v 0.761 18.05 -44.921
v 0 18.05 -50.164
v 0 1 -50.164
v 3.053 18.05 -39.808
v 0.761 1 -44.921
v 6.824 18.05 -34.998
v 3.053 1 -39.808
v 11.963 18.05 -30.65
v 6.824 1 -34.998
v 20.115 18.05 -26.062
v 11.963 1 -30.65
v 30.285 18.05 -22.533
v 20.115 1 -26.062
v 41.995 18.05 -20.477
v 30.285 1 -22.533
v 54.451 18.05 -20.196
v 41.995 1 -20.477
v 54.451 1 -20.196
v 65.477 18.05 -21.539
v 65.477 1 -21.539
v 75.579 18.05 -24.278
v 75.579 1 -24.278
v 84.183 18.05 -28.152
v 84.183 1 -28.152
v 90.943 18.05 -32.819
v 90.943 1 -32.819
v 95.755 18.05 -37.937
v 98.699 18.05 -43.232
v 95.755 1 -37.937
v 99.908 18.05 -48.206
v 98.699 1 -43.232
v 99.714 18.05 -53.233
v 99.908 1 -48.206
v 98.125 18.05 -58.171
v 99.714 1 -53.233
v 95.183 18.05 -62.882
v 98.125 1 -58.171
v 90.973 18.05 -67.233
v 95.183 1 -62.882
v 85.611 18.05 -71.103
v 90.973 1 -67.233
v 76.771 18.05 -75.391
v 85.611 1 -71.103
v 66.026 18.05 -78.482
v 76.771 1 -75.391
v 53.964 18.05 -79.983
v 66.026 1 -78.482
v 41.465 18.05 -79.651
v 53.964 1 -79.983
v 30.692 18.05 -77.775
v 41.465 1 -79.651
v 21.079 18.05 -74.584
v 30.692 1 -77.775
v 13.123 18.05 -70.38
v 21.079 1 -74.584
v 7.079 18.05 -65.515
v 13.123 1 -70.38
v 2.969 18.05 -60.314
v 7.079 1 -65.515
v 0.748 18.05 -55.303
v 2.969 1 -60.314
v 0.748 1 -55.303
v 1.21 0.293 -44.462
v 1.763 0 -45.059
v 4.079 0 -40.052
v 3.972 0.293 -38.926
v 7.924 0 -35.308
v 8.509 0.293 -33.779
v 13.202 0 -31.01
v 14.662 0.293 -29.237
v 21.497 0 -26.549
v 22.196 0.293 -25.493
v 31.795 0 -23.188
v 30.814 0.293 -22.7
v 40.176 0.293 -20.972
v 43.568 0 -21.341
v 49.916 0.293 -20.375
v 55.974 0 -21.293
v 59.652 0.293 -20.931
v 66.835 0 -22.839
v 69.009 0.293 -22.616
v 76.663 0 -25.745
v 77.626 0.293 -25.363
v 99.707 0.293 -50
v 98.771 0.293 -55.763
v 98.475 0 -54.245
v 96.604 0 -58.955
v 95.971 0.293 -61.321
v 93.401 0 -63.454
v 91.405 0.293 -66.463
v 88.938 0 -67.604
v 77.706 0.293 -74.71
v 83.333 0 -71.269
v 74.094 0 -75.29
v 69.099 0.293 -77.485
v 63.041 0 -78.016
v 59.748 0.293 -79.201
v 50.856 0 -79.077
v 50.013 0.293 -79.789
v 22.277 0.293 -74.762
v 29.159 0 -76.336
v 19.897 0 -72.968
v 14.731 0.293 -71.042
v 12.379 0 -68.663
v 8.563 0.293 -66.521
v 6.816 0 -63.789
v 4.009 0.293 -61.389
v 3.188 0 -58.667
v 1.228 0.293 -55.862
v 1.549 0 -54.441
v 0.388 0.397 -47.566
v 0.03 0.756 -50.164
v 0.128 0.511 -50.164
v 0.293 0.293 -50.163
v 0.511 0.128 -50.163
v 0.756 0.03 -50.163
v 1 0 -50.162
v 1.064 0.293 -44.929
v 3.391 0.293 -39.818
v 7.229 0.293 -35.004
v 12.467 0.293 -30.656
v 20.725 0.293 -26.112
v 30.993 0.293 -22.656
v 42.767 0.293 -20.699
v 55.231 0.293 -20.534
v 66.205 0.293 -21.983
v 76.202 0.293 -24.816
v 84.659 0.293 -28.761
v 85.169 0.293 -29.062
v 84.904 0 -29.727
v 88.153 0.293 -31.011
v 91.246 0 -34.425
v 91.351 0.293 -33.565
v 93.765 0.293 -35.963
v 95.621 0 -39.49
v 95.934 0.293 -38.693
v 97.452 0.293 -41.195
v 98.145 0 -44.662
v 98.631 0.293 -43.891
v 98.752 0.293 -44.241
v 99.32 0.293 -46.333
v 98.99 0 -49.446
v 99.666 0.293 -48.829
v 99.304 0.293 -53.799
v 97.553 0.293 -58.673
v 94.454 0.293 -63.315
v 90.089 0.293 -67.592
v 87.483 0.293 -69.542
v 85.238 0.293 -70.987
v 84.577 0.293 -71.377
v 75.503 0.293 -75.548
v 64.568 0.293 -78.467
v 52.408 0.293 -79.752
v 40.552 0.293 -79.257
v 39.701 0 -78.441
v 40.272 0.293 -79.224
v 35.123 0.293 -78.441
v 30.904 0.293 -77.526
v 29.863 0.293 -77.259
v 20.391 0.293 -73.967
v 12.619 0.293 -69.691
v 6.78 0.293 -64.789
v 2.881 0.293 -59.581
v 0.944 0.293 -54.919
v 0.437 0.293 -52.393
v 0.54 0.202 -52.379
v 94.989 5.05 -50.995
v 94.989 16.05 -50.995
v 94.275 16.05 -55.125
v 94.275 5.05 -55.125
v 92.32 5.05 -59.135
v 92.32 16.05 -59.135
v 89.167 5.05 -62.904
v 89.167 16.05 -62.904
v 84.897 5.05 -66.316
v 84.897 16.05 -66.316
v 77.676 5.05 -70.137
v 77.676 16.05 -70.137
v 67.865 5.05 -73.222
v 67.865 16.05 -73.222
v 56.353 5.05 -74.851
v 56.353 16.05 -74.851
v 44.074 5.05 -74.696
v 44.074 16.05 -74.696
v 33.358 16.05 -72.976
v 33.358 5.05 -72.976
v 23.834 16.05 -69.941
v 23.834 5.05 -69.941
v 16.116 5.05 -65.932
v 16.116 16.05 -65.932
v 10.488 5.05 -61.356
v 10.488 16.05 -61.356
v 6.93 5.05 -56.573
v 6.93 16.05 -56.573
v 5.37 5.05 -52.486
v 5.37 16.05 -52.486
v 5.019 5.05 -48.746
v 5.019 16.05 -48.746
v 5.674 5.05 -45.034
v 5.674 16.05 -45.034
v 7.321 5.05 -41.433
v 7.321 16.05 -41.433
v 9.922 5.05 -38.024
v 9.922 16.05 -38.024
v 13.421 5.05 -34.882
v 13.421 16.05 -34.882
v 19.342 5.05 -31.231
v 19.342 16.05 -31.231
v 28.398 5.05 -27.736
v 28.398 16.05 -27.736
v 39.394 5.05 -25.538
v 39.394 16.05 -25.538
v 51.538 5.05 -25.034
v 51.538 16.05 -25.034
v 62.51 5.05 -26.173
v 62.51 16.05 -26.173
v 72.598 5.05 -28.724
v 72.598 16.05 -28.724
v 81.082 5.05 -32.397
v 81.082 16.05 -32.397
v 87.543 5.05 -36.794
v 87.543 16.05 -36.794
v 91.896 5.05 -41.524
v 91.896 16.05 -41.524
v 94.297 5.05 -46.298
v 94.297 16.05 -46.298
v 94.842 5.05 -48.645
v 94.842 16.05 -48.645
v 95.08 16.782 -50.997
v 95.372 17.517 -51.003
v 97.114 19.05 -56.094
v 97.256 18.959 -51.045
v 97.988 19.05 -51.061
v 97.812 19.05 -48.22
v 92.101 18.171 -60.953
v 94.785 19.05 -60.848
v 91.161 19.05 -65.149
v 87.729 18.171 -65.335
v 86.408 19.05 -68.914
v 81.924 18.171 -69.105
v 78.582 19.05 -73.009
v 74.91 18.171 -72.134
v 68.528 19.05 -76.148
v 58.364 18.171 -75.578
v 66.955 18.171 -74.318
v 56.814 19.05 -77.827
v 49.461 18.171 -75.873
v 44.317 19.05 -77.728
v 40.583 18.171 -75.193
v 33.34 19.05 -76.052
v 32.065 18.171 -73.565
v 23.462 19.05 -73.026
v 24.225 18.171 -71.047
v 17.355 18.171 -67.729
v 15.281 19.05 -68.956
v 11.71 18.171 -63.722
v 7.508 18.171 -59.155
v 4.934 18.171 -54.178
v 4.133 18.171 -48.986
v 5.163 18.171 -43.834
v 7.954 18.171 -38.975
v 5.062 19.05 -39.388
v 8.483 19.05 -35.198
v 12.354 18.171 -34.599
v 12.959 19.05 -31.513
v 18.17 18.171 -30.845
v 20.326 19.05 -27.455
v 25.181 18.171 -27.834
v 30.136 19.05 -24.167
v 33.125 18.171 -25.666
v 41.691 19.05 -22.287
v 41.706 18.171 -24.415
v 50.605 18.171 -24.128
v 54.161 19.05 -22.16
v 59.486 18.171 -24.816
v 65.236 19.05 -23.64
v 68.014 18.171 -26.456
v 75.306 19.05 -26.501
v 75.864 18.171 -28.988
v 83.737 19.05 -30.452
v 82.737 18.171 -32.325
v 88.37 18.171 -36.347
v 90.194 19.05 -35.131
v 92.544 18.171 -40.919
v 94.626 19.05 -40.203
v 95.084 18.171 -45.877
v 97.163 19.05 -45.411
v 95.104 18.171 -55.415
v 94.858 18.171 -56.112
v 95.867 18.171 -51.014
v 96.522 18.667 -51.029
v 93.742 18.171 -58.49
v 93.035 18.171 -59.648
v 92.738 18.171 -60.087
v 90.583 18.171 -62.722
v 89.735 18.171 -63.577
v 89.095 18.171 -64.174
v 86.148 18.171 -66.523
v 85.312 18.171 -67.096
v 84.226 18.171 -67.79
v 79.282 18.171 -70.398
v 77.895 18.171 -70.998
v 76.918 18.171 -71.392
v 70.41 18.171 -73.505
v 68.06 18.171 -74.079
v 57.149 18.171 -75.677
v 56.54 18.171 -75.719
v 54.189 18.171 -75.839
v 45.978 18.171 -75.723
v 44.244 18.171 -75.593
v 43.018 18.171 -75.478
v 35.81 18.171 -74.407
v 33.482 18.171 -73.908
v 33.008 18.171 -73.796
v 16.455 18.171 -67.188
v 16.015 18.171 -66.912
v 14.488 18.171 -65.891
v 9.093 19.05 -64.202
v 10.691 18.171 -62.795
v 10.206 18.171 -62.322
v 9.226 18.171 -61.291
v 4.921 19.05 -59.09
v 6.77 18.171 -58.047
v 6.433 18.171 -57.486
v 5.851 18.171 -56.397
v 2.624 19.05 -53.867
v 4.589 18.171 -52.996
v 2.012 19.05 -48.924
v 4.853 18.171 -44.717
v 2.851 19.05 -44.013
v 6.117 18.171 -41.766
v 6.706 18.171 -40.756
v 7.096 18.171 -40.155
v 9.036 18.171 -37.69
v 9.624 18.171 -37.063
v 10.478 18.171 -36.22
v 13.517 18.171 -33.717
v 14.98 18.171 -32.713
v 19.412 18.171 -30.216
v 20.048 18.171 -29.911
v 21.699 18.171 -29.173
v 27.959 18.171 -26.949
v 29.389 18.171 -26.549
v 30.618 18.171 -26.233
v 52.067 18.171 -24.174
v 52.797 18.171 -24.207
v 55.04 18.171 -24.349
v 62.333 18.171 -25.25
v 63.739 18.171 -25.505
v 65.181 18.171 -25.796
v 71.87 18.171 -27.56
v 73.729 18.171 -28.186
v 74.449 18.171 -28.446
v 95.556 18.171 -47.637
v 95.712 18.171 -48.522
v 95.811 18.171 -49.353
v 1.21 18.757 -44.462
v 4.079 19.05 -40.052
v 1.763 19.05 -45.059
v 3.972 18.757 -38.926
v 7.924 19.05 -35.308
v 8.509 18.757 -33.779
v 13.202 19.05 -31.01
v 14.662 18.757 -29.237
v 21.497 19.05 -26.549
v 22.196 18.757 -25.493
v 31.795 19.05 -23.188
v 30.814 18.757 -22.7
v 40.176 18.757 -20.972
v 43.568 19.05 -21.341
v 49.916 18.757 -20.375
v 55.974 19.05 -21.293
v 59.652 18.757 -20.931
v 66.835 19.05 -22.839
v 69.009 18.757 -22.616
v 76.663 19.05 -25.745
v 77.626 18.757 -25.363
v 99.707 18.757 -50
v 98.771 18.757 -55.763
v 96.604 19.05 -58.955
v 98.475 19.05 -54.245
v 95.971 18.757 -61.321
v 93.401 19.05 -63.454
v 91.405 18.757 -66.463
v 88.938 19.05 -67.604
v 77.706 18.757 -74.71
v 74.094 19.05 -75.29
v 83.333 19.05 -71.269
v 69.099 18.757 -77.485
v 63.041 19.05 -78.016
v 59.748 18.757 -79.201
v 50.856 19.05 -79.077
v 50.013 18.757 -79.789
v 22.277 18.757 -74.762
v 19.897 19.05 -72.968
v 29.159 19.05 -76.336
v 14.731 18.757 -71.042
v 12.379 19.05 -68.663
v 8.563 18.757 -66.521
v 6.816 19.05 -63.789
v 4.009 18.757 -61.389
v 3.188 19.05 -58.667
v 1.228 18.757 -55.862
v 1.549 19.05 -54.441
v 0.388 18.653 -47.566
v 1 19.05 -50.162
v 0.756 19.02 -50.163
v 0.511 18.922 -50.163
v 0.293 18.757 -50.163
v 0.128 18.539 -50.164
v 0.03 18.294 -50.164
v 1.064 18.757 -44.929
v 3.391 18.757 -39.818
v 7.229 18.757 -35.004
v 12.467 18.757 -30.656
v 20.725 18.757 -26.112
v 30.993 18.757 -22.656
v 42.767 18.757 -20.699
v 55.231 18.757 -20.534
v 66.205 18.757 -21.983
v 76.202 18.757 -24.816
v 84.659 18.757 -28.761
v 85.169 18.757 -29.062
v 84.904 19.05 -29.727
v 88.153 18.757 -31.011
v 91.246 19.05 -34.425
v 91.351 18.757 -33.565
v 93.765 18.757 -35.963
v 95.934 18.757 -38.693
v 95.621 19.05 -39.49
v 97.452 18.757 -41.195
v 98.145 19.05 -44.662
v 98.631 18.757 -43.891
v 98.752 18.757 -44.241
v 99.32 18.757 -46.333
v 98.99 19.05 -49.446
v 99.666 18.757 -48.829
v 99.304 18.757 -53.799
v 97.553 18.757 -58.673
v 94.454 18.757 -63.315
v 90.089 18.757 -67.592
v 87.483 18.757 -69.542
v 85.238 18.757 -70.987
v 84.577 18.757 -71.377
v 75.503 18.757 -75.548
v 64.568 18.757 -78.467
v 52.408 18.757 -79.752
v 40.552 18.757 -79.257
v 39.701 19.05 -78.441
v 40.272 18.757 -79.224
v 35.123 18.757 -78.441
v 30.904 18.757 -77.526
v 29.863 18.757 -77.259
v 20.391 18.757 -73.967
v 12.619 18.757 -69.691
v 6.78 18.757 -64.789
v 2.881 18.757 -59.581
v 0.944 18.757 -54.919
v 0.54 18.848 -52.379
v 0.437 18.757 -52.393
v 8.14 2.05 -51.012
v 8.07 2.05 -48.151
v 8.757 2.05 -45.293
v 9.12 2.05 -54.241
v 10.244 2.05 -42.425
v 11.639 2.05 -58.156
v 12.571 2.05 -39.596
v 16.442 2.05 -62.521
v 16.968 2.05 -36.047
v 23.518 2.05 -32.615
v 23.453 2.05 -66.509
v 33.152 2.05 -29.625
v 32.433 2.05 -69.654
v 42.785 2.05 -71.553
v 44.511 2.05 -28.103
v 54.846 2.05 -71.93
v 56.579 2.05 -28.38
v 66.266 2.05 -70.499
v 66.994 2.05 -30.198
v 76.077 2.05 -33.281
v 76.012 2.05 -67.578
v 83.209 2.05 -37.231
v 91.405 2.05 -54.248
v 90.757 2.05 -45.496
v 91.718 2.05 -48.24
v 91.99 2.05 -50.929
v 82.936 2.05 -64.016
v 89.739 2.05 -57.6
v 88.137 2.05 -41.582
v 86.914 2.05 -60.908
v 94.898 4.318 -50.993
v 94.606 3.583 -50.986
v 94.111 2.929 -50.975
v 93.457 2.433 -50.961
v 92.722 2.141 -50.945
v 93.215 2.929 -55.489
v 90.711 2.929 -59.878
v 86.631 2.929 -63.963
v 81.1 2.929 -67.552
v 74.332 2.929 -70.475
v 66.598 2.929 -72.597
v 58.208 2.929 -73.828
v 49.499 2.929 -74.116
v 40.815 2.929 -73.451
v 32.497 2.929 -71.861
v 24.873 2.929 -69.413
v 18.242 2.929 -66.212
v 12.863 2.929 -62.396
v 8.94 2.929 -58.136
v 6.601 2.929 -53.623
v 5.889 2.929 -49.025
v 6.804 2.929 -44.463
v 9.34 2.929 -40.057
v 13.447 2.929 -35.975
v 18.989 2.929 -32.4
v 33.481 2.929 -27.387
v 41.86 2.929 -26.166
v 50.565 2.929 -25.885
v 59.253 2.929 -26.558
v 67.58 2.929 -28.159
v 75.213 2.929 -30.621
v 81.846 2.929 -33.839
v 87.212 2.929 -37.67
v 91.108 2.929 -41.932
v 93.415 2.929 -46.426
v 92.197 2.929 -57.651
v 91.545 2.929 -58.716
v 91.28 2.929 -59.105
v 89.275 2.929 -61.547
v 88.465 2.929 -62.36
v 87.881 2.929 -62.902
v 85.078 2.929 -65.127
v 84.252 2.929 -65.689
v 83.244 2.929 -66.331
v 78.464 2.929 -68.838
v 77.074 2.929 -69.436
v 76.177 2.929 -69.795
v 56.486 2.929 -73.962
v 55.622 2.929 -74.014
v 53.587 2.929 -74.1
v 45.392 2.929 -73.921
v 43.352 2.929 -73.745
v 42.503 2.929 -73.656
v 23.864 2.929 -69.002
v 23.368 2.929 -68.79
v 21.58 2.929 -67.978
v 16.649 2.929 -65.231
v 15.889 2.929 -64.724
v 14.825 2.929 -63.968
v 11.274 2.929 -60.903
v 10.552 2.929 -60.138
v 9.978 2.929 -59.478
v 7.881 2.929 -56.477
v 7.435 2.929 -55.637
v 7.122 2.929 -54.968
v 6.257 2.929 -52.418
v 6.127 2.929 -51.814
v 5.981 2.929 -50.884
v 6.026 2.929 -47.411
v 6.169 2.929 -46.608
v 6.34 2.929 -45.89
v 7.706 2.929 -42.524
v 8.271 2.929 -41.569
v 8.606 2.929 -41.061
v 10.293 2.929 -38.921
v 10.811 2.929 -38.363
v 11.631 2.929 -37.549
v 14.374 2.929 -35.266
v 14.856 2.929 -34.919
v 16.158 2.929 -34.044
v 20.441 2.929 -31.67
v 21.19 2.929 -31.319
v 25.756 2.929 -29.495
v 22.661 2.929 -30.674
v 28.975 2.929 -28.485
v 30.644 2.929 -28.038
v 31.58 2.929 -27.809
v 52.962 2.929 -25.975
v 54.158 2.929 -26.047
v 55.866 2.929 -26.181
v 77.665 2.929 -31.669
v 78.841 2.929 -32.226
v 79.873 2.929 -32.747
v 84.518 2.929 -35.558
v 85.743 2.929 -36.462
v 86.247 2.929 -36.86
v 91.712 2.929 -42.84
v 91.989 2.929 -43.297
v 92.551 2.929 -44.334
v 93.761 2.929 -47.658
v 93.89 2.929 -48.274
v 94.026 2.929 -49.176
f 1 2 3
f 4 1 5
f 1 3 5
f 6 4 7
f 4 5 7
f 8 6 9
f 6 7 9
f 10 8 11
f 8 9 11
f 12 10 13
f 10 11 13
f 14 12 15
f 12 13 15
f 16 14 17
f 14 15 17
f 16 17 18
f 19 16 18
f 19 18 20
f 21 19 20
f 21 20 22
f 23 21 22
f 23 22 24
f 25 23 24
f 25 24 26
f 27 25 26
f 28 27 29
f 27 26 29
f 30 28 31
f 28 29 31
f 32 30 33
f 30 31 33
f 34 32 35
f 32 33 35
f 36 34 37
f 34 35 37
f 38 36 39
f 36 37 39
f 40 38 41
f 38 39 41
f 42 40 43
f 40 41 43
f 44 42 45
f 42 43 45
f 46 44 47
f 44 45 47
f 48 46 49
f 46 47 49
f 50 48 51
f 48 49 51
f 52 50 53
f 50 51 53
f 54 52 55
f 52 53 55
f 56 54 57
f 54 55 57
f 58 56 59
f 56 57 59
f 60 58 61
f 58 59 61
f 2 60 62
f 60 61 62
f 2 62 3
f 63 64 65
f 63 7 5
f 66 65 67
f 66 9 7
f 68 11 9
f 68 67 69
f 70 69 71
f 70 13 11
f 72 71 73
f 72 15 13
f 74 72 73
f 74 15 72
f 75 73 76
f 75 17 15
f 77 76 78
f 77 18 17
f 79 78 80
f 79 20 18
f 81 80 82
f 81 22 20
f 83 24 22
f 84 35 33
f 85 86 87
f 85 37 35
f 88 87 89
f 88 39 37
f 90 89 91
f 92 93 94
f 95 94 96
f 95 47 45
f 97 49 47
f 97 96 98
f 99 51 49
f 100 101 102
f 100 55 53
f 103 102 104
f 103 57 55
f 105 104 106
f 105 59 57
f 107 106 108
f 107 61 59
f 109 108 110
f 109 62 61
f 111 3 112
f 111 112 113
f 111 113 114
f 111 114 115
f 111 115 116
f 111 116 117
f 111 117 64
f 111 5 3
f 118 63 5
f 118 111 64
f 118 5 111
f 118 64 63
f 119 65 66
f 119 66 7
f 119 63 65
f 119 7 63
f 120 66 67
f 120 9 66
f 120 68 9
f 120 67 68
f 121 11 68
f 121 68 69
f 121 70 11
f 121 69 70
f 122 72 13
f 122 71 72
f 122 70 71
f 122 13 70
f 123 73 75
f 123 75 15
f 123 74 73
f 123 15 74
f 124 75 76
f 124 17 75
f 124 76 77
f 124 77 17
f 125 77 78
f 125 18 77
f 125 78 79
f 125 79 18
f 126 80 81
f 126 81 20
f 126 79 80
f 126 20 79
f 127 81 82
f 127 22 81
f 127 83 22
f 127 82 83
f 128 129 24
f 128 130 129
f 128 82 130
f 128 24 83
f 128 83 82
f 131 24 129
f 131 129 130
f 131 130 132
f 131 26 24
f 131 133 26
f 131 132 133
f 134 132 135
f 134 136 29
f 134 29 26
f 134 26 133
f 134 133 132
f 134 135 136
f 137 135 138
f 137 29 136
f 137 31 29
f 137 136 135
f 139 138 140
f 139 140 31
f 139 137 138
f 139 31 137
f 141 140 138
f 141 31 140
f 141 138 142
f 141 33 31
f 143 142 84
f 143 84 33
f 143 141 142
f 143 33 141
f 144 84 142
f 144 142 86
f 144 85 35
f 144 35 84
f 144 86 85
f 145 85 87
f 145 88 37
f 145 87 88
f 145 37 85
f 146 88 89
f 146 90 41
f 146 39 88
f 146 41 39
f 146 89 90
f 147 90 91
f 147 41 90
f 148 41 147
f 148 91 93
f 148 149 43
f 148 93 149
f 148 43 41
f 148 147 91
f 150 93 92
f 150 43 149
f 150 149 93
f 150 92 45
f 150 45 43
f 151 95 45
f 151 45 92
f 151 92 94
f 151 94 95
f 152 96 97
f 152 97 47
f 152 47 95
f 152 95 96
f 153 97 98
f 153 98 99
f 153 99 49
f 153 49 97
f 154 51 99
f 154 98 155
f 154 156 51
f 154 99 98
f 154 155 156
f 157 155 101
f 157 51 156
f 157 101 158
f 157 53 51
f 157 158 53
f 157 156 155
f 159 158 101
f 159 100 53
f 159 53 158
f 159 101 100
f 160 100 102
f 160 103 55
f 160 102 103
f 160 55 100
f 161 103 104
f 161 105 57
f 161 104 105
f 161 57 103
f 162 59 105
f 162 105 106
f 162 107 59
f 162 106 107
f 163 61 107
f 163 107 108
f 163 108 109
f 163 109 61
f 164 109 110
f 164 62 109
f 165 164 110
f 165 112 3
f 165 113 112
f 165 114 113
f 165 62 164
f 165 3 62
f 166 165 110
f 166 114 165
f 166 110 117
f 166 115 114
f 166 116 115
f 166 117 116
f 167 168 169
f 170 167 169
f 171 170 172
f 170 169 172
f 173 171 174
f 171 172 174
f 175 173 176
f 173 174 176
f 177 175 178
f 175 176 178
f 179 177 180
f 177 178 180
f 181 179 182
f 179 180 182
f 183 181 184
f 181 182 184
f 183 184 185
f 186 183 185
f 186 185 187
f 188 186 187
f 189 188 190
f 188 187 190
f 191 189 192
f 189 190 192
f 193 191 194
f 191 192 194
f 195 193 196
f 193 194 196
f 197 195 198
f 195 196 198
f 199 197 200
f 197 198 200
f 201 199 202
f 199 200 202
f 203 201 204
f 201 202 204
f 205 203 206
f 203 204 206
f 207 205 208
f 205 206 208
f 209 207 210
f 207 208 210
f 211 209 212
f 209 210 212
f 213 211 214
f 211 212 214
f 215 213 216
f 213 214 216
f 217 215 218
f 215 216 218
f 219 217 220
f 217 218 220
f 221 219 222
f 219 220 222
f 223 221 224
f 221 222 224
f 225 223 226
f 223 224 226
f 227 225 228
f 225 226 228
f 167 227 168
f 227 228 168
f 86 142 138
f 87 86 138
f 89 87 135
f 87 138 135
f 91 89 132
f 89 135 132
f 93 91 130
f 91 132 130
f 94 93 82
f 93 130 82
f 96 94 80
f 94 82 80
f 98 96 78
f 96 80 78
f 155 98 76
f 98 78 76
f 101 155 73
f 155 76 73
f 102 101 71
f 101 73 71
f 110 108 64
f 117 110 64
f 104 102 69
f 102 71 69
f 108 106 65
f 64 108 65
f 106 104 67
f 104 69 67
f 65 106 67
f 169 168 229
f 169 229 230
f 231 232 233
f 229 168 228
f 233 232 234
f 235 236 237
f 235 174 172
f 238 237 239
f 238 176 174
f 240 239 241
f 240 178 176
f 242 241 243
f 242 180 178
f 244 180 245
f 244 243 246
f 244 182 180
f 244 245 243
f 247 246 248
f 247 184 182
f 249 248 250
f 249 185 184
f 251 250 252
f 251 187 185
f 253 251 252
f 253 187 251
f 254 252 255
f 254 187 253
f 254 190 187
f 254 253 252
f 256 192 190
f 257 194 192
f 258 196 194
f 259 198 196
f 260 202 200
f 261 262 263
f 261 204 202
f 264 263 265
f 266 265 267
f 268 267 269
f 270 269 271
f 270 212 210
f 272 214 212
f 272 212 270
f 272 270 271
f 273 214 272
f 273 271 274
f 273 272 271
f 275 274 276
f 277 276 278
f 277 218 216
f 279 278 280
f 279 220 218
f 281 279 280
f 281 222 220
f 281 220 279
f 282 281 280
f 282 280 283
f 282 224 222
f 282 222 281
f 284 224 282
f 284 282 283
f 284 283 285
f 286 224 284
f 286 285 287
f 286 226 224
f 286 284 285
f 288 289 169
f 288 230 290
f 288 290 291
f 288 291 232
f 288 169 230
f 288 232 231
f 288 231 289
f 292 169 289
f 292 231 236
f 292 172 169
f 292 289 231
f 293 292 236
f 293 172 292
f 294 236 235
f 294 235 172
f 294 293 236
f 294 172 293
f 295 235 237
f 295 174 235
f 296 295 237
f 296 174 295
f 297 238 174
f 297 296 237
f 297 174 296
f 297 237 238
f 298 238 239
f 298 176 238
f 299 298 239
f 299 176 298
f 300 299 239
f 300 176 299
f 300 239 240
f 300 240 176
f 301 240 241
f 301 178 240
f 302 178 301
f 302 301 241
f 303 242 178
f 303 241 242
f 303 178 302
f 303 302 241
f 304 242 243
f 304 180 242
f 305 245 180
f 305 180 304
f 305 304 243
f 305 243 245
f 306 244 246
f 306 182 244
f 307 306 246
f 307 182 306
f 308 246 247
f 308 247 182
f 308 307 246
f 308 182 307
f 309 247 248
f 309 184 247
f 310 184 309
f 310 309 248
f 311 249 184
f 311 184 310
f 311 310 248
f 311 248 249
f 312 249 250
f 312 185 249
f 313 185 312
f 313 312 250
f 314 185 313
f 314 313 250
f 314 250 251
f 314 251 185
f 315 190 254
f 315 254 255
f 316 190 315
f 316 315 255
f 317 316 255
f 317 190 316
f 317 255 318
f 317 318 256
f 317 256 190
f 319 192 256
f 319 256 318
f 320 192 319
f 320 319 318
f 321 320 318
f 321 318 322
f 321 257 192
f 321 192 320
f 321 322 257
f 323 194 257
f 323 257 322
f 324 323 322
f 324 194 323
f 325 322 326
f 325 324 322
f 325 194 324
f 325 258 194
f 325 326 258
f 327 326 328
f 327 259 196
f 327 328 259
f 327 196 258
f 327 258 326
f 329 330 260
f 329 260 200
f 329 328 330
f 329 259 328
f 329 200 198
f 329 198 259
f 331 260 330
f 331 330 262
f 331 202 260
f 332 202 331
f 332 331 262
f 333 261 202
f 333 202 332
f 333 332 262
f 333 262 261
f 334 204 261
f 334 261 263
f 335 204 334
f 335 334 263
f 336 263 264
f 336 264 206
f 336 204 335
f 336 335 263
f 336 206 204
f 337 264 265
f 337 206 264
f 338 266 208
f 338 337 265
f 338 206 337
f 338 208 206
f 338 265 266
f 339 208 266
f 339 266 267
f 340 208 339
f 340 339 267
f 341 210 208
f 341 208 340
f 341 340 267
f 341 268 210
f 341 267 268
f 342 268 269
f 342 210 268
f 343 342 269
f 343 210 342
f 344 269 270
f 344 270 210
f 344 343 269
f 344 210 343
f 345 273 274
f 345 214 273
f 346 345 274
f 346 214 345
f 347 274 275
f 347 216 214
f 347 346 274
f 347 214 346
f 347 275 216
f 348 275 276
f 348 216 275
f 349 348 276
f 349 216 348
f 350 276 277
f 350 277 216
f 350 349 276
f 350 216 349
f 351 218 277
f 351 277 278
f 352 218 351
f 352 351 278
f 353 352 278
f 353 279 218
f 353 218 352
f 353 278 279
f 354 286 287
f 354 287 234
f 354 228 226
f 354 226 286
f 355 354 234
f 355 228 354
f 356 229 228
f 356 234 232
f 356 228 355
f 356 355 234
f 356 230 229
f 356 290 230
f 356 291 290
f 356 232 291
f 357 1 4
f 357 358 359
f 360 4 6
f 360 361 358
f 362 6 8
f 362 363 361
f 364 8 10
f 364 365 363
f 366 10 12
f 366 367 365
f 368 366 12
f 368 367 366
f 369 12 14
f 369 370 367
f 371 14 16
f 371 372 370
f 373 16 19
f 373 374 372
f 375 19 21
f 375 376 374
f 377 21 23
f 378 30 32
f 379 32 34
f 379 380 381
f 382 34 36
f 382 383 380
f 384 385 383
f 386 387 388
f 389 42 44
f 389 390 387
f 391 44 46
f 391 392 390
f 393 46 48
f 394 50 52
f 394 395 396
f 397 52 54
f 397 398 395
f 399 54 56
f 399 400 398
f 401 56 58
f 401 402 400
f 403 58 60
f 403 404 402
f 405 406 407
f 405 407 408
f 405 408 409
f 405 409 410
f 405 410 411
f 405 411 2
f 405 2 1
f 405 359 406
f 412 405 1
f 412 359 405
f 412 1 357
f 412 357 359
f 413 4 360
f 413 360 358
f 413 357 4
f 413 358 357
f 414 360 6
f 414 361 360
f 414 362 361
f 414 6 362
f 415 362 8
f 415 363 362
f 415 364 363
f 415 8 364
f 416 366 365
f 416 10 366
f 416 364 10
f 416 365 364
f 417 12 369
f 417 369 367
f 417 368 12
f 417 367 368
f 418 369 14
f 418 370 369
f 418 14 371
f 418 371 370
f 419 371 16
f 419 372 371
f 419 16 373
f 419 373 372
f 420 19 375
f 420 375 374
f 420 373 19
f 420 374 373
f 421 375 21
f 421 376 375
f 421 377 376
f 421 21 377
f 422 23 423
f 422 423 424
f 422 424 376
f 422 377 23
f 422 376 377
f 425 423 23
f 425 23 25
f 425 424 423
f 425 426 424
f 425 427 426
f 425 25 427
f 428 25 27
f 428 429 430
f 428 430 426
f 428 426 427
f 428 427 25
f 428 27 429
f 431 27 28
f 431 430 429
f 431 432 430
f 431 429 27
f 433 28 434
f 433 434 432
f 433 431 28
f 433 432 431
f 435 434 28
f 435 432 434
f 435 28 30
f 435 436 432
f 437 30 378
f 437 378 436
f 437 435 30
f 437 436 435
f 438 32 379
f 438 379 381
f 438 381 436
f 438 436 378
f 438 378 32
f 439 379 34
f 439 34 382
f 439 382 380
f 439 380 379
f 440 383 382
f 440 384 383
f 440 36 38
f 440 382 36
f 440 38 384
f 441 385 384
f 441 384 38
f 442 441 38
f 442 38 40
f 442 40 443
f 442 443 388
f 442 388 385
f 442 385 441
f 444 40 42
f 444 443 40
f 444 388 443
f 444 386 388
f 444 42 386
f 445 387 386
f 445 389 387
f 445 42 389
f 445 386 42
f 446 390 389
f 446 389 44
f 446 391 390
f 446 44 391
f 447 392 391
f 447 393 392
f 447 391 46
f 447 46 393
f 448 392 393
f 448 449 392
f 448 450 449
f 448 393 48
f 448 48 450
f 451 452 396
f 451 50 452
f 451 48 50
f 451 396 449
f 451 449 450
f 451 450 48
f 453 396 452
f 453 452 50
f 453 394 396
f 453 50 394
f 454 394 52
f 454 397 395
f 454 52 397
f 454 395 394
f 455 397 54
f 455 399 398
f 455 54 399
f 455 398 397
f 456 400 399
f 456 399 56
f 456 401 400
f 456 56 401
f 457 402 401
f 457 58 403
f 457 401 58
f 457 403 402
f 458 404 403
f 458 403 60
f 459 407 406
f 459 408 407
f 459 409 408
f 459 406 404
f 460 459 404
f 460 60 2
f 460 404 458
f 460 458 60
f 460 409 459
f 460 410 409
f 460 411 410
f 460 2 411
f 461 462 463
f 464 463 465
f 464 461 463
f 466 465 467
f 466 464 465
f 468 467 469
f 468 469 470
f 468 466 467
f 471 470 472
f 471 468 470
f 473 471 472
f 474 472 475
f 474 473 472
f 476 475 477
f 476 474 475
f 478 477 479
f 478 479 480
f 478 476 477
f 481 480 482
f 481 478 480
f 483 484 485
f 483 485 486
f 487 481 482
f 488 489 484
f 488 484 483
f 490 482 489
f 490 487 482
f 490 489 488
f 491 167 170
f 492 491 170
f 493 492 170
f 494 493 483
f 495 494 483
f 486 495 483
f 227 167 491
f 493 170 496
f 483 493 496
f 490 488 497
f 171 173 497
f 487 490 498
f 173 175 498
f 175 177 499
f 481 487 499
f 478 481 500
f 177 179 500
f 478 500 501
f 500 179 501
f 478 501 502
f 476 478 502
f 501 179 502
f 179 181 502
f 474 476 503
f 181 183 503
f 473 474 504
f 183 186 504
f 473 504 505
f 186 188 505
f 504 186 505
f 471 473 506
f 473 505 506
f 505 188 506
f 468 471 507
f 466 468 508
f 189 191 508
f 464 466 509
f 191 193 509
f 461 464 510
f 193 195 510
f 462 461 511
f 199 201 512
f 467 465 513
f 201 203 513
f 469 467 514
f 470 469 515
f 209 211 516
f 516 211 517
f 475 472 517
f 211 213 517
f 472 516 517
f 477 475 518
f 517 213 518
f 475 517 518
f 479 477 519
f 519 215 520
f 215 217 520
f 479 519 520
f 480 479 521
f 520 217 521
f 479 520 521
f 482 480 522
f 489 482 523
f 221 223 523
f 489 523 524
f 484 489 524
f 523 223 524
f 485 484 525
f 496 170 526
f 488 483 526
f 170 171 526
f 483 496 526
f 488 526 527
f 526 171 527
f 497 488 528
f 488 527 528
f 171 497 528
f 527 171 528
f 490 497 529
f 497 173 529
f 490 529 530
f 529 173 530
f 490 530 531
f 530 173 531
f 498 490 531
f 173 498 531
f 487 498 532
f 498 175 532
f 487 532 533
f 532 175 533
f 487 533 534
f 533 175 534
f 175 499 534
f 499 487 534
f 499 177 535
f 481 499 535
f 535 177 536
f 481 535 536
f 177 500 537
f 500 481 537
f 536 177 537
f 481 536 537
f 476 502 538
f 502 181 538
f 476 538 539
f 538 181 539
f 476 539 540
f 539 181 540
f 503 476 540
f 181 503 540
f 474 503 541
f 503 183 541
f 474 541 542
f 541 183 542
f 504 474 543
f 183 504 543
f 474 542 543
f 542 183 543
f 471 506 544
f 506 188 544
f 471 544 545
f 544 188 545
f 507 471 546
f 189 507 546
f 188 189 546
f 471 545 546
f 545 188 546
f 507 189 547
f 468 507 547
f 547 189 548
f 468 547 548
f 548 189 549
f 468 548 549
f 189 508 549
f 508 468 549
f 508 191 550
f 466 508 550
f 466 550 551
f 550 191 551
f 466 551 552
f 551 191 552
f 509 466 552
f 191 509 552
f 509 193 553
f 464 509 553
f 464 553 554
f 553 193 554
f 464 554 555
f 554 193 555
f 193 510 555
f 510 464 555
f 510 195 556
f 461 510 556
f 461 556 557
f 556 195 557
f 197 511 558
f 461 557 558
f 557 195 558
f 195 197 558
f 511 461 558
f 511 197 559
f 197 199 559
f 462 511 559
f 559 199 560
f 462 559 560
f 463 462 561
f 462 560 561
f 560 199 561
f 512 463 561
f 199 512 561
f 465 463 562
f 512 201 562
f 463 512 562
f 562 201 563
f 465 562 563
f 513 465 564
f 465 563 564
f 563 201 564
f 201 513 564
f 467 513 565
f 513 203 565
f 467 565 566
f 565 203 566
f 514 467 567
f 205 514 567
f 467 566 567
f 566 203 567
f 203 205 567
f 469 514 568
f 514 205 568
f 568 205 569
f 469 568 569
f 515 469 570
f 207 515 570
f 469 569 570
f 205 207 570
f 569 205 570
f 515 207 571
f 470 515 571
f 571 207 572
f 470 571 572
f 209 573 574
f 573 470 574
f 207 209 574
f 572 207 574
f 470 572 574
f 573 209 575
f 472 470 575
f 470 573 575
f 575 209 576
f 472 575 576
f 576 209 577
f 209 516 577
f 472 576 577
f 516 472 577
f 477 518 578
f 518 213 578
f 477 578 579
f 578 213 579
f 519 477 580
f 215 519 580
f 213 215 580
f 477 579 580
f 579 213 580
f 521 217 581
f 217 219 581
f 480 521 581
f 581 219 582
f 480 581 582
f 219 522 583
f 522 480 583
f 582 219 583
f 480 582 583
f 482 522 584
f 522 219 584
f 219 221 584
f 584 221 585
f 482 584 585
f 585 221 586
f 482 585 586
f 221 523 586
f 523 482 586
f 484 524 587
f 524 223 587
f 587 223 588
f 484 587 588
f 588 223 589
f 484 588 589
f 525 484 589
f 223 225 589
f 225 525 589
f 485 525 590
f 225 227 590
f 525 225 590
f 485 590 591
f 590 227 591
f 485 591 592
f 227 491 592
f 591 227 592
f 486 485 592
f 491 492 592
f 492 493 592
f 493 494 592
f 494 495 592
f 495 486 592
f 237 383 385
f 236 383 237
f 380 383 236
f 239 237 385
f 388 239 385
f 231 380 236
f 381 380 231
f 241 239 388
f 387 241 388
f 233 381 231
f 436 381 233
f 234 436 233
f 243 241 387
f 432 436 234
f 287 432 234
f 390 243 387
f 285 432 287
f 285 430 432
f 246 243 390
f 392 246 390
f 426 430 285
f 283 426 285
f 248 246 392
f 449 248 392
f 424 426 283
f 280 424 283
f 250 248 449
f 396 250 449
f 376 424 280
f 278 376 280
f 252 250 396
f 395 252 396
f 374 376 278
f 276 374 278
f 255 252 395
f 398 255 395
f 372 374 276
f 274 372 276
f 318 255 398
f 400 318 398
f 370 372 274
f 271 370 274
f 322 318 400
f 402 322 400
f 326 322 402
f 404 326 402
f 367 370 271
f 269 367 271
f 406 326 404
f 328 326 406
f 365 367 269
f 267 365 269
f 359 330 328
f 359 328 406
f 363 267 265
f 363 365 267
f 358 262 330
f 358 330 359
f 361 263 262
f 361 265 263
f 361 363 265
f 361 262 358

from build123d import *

# Parameters (mm, degrees)
SKETCH2_RX          = 50
SKETCH2_RY          = 30
BOSS_EXTRUDE1_DEPTH = 19.05
SKETCH3_RX          = 45
SKETCH3_RY          = 25
CUT_EXTRUDE1_DEPTH  = 17
FILLET1_R           = 3
FILLET2_R           = 3
FILLET4_R           = 1
FILLET5_R           = 1


with BuildPart() as part:
    # Sketch2 → Boss-Extrude1 (new body)
    with BuildSketch(Plane(origin=(0, 0, 0), x_dir=(1, 0, 0), z_dir=(0, 1, 0))):
        with Locations(Location((50.000067053, 50.081885905), (0, 0, 179.906165623))):
            Ellipse(SKETCH2_RX, SKETCH2_RY)
    extrude(amount=BOSS_EXTRUDE1_DEPTH)

    # Sketch3 → Cut-Extrude1 (cut)
    with BuildSketch(Plane(origin=(0, 19.05, 0), x_dir=(1, 0, 0), z_dir=(0, 1, 0))):
        with Locations(Location((50, 50), (0, 0, 1.266776388))):
            Ellipse(SKETCH3_RX, SKETCH3_RY)
    extrude(amount=-CUT_EXTRUDE1_DEPTH, mode=Mode.SUBTRACT)

    # Fillet1
    fillet1_edges = [part.edges().sort_by_distance(p)[0] for p in [
        (5.013318209, 2.05, -48.913829528),
    ]]
    fillet(fillet1_edges, radius=FILLET1_R)

    # Fillet2
    fillet2_edges = [part.edges().sort_by_distance(p)[0] for p in [
        (5.013318209, 19.05, -48.913829528),
    ]]
    fillet(fillet2_edges, radius=FILLET2_R)

    # Fillet4
    fillet4_edges = [part.edges().sort_by_distance(p)[0] for p in [
        (99.999981674, 19.05, -50.06857837),
    ]]
    fillet(fillet4_edges, radius=FILLET4_R)

    # Fillet5
    fillet5_edges = [part.edges().sort_by_distance(p)[0] for p in [
        (99.999981674, 0, -50.06857837),
    ]]
    fillet(fillet5_edges, radius=FILLET5_R)


solid = part.part
